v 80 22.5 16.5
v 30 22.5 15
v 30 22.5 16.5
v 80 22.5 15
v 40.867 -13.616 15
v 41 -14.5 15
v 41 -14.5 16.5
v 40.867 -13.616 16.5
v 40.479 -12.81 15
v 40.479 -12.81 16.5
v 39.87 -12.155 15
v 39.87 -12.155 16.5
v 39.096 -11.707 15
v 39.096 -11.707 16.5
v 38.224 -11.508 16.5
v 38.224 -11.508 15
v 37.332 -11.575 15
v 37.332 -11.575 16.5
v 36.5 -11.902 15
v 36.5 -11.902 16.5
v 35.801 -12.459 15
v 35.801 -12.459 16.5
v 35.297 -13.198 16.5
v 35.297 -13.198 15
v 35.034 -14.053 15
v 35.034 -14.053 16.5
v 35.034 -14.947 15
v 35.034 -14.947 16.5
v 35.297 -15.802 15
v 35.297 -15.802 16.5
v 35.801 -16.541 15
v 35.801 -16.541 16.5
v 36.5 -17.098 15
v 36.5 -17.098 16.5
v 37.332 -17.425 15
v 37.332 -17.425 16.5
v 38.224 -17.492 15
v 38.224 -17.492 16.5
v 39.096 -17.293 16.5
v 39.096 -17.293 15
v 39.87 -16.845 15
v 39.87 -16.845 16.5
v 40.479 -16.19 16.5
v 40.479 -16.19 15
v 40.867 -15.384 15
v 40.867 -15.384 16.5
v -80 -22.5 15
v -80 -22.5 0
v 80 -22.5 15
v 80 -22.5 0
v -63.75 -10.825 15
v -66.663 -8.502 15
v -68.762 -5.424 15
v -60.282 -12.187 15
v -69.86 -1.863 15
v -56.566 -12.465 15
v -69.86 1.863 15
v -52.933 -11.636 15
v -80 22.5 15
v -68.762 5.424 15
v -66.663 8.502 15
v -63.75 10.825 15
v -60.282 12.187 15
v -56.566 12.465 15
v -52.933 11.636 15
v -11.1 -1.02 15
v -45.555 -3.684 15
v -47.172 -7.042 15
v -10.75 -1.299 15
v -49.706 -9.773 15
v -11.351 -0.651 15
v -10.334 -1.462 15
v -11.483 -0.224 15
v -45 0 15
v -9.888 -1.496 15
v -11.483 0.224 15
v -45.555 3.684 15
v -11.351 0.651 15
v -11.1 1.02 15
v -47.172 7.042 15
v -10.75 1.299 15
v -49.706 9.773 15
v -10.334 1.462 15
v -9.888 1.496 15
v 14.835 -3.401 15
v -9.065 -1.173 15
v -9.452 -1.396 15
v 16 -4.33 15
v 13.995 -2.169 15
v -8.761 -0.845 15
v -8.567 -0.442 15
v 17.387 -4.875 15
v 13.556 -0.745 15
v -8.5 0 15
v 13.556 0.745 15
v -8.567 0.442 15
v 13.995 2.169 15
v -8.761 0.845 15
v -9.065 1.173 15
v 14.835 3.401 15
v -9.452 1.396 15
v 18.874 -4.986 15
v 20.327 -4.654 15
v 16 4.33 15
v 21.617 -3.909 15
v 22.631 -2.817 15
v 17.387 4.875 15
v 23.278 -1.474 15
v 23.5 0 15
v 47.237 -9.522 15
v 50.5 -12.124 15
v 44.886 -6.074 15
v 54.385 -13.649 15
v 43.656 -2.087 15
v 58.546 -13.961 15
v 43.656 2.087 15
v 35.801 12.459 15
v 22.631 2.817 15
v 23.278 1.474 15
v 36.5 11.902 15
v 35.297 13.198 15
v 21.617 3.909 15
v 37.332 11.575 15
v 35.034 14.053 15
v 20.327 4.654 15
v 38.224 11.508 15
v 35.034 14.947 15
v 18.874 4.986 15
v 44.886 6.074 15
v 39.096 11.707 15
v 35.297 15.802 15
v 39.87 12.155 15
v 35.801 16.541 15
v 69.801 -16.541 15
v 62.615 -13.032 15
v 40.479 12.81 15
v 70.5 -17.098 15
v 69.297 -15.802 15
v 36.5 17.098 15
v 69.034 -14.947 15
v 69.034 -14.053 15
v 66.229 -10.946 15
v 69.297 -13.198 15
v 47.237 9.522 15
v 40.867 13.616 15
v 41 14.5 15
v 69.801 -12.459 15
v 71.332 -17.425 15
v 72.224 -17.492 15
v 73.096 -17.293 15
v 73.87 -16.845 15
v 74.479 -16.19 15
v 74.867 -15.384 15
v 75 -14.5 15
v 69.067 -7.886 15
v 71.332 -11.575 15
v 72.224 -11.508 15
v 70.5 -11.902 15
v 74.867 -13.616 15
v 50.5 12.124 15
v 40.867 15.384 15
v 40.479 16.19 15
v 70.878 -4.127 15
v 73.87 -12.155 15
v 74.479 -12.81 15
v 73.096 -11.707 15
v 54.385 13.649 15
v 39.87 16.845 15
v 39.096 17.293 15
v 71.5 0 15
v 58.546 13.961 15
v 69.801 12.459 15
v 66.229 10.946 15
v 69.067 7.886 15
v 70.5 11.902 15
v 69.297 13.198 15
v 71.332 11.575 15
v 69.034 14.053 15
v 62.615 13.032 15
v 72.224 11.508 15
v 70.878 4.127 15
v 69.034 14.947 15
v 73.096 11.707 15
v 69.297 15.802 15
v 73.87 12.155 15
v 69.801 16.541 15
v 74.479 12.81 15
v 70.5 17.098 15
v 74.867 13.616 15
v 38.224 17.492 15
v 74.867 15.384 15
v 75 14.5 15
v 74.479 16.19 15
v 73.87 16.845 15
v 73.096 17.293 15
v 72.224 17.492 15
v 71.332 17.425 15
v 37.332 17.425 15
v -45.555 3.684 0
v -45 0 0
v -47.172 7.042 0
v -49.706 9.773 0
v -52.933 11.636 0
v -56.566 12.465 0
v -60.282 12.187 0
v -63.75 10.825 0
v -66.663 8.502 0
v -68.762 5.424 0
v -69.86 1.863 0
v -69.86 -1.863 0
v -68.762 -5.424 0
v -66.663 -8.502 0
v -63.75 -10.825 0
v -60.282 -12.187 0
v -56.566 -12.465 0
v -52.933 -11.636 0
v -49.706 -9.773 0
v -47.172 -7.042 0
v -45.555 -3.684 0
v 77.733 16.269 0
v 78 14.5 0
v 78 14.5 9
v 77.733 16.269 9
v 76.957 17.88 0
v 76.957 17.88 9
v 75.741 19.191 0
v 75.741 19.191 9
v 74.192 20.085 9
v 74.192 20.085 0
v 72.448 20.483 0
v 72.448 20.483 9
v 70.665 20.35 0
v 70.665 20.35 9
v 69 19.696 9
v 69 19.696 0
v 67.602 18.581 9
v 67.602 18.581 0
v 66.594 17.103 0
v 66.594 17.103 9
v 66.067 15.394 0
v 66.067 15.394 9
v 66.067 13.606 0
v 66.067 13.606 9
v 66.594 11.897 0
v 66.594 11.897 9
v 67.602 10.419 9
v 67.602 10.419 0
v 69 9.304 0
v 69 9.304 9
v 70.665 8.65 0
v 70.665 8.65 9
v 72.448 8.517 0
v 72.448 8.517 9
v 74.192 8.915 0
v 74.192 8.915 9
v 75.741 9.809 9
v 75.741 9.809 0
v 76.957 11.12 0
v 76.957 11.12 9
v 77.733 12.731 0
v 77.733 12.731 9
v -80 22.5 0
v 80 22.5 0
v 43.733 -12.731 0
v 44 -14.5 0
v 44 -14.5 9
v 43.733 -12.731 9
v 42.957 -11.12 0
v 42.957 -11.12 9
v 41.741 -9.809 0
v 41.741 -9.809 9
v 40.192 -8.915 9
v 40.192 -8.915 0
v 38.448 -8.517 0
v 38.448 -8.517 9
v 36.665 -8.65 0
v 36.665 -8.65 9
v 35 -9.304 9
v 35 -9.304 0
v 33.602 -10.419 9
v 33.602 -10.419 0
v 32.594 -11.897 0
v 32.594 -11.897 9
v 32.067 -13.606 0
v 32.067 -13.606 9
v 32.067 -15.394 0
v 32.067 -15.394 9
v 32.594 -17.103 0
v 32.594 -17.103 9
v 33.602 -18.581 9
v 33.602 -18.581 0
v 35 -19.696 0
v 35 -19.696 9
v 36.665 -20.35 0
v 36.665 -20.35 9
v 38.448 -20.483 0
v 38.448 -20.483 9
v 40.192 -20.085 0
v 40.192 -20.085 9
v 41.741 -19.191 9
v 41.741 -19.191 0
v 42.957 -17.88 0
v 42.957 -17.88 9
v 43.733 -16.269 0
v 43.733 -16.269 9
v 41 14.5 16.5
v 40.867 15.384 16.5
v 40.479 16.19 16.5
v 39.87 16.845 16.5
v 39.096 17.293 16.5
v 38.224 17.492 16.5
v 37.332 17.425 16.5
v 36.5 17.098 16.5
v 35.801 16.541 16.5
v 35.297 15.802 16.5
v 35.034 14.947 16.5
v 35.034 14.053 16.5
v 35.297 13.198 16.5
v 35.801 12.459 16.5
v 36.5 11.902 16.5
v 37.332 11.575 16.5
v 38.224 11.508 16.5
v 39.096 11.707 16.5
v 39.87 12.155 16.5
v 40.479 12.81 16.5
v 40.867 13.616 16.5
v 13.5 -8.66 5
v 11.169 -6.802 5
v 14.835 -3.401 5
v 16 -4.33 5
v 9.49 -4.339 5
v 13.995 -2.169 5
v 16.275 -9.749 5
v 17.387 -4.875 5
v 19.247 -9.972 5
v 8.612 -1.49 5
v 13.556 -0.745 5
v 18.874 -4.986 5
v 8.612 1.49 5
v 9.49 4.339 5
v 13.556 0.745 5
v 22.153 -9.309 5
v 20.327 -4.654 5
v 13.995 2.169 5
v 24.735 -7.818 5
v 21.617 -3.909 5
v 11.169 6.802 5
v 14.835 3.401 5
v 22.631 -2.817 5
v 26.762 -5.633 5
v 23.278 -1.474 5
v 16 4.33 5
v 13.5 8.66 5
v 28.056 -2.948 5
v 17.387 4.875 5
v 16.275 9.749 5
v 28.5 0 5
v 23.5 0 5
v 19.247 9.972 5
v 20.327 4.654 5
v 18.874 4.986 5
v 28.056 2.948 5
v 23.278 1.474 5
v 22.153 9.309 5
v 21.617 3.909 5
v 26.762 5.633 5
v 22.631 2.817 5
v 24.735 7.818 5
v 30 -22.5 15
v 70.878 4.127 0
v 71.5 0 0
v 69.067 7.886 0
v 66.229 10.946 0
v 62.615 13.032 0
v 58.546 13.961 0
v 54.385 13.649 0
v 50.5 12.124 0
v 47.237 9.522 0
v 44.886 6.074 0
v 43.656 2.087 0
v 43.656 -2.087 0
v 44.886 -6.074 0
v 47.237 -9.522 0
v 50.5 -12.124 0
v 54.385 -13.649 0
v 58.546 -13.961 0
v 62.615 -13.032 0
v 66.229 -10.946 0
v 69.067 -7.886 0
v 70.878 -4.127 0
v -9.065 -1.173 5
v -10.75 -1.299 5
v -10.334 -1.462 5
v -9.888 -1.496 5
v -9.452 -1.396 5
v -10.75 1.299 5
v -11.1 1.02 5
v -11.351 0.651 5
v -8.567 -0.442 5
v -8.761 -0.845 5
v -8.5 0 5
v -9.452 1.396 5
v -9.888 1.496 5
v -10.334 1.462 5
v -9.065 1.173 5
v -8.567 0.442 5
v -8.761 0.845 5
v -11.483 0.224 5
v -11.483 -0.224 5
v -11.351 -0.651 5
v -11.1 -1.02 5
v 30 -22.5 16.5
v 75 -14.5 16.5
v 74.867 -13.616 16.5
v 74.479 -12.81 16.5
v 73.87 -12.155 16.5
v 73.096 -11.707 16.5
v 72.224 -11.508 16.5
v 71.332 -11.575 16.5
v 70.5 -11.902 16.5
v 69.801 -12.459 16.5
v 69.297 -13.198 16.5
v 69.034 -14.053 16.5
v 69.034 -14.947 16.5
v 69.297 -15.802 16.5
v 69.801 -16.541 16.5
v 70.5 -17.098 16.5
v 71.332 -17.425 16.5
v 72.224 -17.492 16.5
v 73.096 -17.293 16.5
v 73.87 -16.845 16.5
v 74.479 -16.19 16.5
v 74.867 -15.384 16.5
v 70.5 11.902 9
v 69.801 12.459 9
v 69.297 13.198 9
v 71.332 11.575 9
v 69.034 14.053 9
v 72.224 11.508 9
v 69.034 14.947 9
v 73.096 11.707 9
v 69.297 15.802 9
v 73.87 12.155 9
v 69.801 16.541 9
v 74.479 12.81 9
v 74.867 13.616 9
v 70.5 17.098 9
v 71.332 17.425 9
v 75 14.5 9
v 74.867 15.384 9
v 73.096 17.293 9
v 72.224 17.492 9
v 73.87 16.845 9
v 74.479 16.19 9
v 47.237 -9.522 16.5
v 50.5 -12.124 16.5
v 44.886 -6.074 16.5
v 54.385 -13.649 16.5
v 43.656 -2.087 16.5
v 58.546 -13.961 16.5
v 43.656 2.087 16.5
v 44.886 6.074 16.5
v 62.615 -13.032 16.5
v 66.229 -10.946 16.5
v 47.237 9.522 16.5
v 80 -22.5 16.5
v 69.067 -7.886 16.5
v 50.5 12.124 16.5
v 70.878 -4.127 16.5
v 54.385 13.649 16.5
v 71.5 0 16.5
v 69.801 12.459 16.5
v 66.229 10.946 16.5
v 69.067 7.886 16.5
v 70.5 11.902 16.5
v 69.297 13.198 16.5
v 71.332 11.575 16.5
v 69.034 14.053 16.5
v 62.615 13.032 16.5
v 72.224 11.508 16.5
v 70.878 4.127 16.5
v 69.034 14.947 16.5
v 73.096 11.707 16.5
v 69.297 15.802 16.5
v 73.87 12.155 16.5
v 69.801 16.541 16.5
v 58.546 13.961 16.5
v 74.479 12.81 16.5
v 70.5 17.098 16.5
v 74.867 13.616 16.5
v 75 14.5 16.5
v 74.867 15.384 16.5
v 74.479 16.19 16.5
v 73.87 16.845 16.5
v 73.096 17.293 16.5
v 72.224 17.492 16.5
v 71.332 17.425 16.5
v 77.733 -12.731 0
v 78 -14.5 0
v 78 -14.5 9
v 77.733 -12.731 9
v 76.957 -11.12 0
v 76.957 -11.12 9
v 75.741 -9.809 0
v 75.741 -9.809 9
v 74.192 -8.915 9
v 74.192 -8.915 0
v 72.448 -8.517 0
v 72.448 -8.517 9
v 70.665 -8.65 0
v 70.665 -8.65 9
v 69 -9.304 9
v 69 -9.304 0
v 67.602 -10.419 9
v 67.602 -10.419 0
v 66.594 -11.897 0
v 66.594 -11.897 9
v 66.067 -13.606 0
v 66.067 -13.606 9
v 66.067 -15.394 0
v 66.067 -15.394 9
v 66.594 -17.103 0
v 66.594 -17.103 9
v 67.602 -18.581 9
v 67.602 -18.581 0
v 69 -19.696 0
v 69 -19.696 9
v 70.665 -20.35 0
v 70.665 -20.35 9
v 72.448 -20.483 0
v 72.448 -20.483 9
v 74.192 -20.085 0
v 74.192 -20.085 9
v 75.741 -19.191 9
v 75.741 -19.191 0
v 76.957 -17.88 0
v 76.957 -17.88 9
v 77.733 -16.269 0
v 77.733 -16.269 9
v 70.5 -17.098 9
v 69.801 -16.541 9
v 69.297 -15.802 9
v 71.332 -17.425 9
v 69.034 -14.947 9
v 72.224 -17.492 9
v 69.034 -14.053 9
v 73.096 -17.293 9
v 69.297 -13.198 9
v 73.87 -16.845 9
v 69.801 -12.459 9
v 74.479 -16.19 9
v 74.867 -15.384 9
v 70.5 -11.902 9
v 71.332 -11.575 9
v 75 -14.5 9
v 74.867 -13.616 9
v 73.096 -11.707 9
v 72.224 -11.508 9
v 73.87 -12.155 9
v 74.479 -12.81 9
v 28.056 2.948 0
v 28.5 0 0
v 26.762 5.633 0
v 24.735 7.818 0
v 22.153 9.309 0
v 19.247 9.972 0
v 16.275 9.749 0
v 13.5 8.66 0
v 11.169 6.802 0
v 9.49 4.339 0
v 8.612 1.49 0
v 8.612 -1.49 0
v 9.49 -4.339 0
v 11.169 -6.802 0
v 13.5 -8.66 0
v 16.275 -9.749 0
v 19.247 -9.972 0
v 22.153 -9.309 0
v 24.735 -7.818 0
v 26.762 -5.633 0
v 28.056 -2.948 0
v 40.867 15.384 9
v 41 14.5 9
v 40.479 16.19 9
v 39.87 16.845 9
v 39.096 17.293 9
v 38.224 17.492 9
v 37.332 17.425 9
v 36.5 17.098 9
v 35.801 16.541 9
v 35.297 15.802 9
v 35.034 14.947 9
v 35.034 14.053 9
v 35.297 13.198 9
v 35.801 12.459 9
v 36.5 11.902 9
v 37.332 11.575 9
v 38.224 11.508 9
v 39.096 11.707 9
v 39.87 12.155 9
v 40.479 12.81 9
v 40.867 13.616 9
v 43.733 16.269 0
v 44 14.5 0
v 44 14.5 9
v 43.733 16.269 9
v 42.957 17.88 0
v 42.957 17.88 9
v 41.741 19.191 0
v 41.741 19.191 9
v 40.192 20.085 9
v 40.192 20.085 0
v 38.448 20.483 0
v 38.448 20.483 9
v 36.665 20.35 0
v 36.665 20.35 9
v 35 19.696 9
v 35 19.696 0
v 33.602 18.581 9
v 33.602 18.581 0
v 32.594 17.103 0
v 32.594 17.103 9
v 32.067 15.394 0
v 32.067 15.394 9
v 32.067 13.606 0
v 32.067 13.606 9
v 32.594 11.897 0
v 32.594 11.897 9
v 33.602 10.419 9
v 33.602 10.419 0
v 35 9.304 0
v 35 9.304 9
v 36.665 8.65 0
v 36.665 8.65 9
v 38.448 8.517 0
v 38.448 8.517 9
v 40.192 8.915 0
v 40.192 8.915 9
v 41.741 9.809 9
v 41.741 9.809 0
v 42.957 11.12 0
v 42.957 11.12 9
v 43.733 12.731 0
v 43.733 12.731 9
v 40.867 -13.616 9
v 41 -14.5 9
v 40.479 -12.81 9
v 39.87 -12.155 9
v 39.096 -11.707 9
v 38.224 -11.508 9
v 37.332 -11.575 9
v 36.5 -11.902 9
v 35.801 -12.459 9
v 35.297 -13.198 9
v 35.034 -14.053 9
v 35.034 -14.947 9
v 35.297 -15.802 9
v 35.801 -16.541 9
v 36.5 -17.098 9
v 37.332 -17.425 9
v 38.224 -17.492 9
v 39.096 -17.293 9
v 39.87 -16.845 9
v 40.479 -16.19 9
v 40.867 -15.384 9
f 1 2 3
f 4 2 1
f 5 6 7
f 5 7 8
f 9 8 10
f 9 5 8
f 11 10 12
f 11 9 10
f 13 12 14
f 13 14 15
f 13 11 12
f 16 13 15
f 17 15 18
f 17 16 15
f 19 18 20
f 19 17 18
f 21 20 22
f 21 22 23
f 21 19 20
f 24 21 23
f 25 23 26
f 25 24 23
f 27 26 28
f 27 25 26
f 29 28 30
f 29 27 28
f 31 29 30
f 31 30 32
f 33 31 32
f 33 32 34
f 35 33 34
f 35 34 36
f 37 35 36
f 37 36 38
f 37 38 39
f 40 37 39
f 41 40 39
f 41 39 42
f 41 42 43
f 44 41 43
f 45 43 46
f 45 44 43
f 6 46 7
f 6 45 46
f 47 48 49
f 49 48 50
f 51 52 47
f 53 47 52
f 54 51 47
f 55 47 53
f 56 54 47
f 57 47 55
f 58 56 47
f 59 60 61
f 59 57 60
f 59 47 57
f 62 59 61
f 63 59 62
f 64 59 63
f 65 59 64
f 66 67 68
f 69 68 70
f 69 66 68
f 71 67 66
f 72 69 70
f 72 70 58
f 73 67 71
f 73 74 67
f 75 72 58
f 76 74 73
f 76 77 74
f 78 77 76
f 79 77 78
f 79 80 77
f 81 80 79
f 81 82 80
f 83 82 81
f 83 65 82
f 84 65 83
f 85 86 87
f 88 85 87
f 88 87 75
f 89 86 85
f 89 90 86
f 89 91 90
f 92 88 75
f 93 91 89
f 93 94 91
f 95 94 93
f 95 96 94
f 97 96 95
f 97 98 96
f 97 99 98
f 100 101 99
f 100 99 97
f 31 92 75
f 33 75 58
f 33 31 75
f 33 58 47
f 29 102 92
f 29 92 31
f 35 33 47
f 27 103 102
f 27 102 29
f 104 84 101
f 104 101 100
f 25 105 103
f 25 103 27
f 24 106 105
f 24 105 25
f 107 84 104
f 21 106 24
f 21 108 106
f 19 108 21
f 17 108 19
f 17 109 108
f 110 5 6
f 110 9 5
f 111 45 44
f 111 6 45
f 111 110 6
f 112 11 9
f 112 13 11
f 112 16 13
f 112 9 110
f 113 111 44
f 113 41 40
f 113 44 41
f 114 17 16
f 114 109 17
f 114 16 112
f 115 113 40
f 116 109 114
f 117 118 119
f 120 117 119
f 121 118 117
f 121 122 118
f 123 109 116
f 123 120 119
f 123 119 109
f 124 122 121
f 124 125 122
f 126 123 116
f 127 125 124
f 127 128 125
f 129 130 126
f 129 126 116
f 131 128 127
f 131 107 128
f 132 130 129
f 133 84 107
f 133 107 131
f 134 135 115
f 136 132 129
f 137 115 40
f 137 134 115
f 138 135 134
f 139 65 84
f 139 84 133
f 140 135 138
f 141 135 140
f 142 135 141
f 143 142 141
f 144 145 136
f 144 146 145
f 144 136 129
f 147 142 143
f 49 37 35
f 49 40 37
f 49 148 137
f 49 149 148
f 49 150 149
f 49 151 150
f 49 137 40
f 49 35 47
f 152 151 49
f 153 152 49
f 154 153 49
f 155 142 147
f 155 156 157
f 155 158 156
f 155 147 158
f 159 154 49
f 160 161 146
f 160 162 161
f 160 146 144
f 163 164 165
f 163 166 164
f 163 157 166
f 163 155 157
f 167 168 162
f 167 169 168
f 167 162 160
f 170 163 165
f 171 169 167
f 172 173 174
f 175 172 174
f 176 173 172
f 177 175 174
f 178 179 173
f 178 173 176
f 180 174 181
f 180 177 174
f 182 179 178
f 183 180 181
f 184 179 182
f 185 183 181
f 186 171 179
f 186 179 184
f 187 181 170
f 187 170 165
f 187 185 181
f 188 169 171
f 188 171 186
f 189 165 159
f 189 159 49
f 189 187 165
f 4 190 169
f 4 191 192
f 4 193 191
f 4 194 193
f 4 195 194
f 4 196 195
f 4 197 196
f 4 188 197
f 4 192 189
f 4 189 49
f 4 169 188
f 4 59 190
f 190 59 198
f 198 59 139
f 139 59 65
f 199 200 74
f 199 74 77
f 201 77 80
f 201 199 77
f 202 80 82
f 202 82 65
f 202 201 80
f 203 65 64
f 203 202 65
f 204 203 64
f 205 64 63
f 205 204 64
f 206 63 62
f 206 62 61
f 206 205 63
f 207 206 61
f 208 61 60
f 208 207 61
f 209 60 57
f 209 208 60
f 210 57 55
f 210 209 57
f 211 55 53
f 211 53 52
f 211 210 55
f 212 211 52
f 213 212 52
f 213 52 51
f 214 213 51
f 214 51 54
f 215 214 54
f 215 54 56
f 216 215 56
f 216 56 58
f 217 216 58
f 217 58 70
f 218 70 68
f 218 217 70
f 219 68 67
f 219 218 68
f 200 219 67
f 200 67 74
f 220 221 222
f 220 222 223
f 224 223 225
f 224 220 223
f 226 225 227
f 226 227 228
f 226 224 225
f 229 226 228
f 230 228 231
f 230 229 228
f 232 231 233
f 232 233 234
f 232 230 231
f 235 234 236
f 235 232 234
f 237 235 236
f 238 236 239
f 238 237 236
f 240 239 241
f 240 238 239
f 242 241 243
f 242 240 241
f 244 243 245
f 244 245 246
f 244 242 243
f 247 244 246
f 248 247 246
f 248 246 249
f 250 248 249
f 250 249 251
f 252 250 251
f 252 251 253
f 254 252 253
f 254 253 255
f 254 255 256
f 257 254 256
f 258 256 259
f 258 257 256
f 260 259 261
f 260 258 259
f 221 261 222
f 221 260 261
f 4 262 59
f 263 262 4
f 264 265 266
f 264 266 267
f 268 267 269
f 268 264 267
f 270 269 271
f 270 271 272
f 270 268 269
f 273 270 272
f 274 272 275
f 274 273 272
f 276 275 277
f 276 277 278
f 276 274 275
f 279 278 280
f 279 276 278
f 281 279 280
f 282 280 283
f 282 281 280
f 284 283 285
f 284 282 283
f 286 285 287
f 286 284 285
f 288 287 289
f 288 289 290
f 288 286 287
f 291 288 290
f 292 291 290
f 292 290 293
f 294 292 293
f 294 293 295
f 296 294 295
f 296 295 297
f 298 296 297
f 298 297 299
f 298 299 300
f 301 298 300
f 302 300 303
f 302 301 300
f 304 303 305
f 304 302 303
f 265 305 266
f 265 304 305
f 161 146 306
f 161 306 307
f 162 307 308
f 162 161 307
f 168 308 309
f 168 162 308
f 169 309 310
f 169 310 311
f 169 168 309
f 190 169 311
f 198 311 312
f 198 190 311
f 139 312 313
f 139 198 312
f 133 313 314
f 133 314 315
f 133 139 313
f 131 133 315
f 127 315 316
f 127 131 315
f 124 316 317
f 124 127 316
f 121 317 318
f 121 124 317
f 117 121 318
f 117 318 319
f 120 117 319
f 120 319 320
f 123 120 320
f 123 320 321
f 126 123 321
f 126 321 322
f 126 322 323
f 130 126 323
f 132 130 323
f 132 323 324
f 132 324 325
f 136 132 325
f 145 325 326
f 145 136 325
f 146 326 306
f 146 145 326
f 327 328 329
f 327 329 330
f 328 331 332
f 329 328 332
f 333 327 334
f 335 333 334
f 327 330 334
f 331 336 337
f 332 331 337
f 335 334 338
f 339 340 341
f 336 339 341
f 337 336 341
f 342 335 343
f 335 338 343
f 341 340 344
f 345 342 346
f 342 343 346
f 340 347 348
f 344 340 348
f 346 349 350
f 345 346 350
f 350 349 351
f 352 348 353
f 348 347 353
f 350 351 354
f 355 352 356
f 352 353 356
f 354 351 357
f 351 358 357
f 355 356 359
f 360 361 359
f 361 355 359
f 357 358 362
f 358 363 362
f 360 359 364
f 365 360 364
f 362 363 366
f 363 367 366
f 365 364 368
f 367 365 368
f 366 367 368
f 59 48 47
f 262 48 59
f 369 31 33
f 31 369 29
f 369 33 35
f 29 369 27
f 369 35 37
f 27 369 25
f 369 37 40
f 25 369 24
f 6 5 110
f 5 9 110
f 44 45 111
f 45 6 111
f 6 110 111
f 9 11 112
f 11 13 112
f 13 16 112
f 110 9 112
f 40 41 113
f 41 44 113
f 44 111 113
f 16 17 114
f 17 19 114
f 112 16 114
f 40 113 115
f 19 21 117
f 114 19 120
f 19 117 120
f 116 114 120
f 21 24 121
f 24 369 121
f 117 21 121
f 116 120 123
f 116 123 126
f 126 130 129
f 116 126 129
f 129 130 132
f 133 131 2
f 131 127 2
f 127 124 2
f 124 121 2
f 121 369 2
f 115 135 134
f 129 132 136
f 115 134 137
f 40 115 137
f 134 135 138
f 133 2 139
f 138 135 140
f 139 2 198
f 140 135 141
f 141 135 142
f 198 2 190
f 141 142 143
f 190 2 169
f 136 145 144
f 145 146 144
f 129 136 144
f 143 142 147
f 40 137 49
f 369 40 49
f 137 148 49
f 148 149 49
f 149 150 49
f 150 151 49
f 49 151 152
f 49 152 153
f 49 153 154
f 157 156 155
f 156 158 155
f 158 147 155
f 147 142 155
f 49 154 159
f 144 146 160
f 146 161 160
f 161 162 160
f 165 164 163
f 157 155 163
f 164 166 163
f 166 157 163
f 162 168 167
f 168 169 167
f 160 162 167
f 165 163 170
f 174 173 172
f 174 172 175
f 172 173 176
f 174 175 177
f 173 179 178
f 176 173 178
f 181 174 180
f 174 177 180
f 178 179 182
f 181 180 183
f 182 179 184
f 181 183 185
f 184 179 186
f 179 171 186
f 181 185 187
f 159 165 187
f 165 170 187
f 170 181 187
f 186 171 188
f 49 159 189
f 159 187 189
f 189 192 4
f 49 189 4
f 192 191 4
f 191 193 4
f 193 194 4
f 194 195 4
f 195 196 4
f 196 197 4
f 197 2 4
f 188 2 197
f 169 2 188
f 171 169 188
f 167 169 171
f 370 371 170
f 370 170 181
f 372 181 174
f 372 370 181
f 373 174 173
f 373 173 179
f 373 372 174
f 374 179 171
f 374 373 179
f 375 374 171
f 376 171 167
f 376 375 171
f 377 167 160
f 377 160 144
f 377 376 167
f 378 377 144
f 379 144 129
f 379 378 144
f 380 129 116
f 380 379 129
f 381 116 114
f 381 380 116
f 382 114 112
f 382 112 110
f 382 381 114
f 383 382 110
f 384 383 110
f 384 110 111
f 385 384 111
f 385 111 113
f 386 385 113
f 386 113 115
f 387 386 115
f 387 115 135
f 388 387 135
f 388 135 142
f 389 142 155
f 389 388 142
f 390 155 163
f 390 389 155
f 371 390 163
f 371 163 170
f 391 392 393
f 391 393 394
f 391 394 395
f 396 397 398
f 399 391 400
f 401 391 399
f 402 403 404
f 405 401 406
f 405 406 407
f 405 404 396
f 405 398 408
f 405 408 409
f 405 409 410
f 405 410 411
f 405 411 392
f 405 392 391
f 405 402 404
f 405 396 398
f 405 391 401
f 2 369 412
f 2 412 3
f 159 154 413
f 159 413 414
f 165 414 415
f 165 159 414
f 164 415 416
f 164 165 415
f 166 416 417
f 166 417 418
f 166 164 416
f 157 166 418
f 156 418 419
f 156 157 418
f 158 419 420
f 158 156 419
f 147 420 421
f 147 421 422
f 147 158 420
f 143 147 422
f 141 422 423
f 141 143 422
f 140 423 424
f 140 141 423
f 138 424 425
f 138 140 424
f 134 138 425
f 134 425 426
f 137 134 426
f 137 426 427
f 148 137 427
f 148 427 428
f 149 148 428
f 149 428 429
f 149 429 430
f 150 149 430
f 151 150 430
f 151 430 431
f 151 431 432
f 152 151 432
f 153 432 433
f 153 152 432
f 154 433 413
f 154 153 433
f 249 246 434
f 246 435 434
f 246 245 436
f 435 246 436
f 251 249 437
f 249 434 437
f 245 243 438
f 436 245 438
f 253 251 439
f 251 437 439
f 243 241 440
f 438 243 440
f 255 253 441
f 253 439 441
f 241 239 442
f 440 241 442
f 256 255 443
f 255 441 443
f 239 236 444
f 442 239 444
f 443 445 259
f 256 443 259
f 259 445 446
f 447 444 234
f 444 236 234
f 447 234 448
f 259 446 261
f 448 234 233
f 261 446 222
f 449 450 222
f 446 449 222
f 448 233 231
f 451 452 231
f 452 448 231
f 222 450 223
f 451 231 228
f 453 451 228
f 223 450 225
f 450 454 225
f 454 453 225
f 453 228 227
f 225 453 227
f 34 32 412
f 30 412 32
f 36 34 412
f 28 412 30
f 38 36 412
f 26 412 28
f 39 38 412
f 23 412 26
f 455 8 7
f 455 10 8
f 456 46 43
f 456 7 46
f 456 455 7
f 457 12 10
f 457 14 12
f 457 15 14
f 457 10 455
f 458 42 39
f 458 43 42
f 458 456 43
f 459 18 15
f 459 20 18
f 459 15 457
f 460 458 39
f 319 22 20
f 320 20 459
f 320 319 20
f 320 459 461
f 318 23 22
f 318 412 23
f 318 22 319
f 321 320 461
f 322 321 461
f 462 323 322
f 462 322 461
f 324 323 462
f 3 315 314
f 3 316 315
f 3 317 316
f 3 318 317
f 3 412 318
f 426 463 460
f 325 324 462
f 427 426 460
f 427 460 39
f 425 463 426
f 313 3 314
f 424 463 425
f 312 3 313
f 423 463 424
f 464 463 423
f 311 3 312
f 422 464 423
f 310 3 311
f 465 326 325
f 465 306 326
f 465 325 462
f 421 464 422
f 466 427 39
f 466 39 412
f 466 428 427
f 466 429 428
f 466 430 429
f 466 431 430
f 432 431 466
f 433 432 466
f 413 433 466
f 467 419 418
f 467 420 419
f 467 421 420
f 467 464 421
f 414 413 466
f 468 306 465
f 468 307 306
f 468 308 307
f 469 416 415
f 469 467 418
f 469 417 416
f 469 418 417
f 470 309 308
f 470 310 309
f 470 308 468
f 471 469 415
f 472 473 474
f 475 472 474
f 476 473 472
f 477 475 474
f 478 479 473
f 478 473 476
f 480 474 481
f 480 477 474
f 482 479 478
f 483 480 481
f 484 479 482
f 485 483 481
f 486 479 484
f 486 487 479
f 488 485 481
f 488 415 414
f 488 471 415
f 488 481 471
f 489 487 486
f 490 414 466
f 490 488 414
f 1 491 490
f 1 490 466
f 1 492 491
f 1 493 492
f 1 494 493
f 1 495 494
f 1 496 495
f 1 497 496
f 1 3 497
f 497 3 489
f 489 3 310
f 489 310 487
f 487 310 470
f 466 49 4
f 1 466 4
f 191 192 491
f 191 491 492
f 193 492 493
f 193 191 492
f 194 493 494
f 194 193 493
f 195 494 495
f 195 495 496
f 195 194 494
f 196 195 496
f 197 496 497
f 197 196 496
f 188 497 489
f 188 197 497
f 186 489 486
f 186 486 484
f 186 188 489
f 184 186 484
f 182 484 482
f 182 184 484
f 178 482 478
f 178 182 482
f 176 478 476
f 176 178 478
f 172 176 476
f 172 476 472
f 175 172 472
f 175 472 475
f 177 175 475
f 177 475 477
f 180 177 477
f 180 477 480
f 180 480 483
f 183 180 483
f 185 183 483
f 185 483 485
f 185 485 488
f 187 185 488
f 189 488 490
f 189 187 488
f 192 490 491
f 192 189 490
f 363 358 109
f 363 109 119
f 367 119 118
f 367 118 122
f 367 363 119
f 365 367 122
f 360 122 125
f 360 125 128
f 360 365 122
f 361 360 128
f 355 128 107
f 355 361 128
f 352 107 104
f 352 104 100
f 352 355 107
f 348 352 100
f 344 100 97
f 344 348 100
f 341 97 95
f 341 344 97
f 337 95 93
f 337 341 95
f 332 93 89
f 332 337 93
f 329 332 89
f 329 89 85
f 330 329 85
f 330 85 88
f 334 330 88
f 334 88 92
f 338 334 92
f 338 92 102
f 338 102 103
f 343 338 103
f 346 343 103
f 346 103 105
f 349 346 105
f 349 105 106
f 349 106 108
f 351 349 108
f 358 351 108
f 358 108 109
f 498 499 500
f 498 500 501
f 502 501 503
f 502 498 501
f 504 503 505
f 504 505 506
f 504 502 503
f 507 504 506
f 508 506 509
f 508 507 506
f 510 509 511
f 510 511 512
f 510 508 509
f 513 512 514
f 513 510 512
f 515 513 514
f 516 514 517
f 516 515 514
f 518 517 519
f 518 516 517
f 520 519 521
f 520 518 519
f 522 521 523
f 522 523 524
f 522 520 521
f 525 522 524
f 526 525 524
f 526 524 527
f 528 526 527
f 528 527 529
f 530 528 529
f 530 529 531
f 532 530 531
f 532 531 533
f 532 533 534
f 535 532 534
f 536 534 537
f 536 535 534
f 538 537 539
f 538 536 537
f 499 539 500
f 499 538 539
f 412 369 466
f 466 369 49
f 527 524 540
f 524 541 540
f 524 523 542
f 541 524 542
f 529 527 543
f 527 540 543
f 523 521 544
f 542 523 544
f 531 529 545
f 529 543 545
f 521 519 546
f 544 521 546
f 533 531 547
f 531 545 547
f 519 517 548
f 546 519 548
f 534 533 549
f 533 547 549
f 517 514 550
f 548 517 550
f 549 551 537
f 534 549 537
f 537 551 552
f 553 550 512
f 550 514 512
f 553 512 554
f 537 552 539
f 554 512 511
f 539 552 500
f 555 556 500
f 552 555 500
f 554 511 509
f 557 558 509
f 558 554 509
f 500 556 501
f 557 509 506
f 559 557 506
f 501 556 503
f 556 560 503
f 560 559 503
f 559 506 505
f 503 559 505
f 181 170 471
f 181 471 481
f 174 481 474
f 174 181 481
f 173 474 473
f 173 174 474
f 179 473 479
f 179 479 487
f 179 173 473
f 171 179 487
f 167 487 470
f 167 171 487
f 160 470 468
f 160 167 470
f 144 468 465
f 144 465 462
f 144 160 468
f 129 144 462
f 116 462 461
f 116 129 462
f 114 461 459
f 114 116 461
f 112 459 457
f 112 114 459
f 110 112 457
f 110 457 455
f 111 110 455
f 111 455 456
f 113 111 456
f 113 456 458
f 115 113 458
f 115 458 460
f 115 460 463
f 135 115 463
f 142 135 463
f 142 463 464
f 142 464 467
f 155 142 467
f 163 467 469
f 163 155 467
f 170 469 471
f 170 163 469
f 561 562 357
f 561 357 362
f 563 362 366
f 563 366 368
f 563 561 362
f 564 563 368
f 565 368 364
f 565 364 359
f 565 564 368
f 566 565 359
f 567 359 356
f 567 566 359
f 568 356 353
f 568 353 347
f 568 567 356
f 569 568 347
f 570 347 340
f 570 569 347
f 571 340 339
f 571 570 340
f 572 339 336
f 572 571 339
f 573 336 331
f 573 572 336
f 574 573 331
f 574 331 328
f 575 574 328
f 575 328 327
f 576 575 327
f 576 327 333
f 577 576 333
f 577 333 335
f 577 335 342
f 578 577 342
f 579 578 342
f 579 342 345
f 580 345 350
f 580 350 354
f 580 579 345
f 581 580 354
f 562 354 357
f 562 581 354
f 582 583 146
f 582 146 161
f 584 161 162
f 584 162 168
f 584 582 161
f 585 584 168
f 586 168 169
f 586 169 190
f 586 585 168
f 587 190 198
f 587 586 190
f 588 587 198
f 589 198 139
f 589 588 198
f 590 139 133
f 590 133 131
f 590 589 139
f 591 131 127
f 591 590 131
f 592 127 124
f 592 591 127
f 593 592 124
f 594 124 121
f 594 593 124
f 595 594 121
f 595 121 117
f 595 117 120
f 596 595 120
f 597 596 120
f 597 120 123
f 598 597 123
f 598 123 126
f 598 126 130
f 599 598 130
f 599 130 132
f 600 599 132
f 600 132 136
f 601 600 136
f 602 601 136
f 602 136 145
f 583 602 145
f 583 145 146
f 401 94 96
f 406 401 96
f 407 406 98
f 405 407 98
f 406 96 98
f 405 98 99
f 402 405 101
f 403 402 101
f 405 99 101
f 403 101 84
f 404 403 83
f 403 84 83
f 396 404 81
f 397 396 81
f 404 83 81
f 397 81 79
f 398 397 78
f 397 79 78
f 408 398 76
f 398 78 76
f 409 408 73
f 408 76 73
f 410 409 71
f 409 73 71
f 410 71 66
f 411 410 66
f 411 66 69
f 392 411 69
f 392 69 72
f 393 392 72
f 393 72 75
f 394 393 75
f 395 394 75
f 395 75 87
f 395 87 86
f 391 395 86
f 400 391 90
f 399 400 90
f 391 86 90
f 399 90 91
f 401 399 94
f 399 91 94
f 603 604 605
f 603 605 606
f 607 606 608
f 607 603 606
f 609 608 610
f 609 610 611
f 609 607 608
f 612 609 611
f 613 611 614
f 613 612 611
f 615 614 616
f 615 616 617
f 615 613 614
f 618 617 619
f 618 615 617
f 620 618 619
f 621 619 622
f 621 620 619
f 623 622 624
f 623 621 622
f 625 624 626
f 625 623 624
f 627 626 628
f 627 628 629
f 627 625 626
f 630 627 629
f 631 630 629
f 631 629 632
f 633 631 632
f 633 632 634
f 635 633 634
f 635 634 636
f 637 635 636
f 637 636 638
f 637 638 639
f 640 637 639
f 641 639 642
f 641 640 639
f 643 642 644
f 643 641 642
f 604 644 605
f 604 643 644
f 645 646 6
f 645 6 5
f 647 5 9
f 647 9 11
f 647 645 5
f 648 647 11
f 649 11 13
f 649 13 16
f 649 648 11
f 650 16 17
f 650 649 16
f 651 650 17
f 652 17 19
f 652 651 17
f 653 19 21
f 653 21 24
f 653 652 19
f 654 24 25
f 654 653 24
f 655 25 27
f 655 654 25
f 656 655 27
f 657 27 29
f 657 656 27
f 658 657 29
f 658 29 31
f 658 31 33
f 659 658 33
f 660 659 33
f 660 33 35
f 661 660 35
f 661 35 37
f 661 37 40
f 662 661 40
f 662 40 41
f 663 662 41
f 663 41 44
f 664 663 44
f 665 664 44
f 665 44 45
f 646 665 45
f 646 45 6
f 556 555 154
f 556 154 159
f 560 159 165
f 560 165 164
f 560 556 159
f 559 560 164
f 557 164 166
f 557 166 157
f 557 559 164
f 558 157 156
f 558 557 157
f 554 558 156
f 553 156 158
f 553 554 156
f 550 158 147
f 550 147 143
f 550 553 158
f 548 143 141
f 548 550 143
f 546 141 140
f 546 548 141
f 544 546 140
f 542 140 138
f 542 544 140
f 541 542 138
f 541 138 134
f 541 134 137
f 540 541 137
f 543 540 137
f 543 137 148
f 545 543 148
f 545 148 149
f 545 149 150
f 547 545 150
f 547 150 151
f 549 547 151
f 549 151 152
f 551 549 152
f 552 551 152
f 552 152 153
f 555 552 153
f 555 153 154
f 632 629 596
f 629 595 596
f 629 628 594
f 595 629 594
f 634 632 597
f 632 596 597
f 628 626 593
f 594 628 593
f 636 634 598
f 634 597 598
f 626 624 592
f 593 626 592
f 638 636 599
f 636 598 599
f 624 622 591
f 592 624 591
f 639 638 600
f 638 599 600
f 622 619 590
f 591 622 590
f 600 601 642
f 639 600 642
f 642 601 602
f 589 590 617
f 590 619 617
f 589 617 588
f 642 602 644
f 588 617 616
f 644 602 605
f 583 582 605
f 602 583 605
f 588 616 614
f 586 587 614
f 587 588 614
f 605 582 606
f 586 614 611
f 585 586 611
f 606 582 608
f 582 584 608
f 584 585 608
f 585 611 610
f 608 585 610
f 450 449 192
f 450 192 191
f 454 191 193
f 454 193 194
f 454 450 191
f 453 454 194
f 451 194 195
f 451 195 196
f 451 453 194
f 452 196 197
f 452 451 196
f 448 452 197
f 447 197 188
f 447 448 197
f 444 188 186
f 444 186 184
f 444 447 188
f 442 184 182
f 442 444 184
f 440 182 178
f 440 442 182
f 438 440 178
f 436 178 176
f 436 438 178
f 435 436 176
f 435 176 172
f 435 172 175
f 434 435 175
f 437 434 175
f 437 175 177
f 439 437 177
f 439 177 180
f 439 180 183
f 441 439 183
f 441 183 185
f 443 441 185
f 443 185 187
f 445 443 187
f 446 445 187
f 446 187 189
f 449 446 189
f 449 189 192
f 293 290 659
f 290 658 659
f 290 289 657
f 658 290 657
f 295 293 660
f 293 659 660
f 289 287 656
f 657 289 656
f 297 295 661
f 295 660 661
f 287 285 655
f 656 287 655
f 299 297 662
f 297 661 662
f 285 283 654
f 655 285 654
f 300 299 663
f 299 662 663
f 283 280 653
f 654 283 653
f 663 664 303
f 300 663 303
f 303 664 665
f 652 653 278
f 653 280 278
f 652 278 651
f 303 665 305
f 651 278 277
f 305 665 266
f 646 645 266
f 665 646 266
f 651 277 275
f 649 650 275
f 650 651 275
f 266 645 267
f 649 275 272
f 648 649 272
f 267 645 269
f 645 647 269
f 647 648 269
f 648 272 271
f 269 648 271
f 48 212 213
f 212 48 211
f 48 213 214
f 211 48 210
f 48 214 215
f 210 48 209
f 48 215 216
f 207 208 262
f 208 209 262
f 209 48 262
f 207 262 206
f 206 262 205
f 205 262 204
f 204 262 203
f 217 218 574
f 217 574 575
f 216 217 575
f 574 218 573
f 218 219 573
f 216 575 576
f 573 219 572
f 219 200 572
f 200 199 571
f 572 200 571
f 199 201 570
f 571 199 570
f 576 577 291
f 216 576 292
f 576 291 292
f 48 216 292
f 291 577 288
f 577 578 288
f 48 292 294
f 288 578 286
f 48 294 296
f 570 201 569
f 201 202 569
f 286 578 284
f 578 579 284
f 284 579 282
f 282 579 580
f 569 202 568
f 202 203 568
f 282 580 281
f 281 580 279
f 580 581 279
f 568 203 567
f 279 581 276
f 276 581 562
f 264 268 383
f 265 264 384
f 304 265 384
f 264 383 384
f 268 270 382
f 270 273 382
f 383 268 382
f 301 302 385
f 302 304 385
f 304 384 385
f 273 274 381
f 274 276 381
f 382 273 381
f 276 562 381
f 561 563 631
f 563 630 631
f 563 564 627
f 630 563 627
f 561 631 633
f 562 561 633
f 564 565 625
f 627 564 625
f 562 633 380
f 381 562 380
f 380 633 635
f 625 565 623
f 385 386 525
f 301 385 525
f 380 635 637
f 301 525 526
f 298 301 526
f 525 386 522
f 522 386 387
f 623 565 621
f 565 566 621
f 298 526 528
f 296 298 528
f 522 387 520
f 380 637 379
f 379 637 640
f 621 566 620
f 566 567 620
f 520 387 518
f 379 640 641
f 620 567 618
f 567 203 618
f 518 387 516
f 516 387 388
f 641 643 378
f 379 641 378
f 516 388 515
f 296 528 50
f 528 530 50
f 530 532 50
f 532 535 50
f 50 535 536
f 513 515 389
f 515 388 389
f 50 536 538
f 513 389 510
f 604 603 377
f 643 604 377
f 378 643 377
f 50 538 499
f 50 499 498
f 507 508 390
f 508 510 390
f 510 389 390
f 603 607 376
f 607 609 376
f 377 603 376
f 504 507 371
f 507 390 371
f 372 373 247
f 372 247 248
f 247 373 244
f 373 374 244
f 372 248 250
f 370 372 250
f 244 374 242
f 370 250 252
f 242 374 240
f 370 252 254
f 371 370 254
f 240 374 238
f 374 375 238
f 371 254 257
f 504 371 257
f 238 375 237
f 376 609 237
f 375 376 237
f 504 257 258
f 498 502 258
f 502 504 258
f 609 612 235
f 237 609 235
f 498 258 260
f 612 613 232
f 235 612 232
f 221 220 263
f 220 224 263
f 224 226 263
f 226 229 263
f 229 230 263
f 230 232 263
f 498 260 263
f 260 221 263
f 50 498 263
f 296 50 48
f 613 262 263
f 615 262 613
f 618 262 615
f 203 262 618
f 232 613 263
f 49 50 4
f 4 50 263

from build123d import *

# Parameters (mm, degrees)
F0_W     = 160
F0_H     = 45
F0_R     = 6
F0_R_2   = 12.5
F0_R_3   = 10
F0_R_4   = 14
F0_R_5   = 5
F0_R_6   = 3
F1_DEPTH = 15
F2_DEPTH = 5
F3_DEPTH = 9
F4_R     = 1.5
F5_DEPTH = 10
F6_W     = 50
F6_H     = 45
F6_R     = 3
F6_R_2   = 14
F7_DEPTH = 1.5


# Not quite as in the source:
# - a feature names something its author has since deleted; it is built from what else it names


with BuildPart() as f1:
    # F0 (on Top) → F1 (new body)
    with BuildSketch(Plane.XY):
        Rectangle(F0_W, F0_H)
        with Locations((38, -14.5)):
            Circle(F0_R, mode=Mode.SUBTRACT)
        with Locations((72, -14.5)):
            Circle(F0_R, mode=Mode.SUBTRACT)
        with Locations((-57.5, 0)):
            Circle(F0_R_2, mode=Mode.SUBTRACT)
        with Locations((18.5, 0)):
            Circle(F0_R_3, mode=Mode.SUBTRACT)
        with Locations((57.5, 0)):
            Circle(F0_R_4, mode=Mode.SUBTRACT)
        with Locations((38, 14.5)):
            Circle(F0_R, mode=Mode.SUBTRACT)
        with Locations((72, 14.5)):
            Circle(F0_R, mode=Mode.SUBTRACT)
        with Locations((18.5, 0)):
            Circle(F0_R_3)
        with Locations((18.5, 0)):
            Circle(F0_R_5, mode=Mode.SUBTRACT)
        with Locations((38, -14.5)):
            Circle(F0_R)
        with Locations((38, -14.5)):
            Circle(F0_R_6, mode=Mode.SUBTRACT)
        with Locations((72, -14.5)):
            Circle(F0_R)
        with Locations((72, -14.5)):
            Circle(F0_R_6, mode=Mode.SUBTRACT)
        with Locations((72, 14.5)):
            Circle(F0_R)
        with Locations((72, 14.5)):
            Circle(F0_R_6, mode=Mode.SUBTRACT)
        with Locations((38, 14.5)):
            Circle(F0_R)
        with Locations((38, 14.5)):
            Circle(F0_R_6, mode=Mode.SUBTRACT)
    extrude(amount=F1_DEPTH)

    # F0 (on Top) → F2 (cut)
    with BuildSketch(Plane.XY):
        with Locations((18.5, 0)):
            Circle(F0_R_3)
        with Locations((18.5, 0)):
            Circle(F0_R_5, mode=Mode.SUBTRACT)
    extrude(amount=F2_DEPTH, mode=Mode.SUBTRACT)

    # F0 (on Top) → F3 (cut)
    with BuildSketch(Plane.XY):
        with Locations((38, -14.5)):
            Circle(F0_R)
        with Locations((38, -14.5)):
            Circle(F0_R_6, mode=Mode.SUBTRACT)
        with Locations((72, -14.5)):
            Circle(F0_R)
        with Locations((72, -14.5)):
            Circle(F0_R_6, mode=Mode.SUBTRACT)
        with Locations((72, 14.5)):
            Circle(F0_R)
        with Locations((72, 14.5)):
            Circle(F0_R_6, mode=Mode.SUBTRACT)
        with Locations((38, 14.5)):
            Circle(F0_R)
        with Locations((38, 14.5)):
            Circle(F0_R_6, mode=Mode.SUBTRACT)
    extrude(amount=F3_DEPTH, mode=Mode.SUBTRACT)

    # F4 (on face) → F5 (cut)
    with BuildSketch(Plane.XY.offset(15)):
        with Locations((-10, 0)):
            Circle(F4_R)
    extrude(amount=-F5_DEPTH, mode=Mode.SUBTRACT)


with BuildPart() as f7:
    # F6 (on face) → F7 (new body)
    with BuildSketch(Plane.XY.offset(15)):
        with Locations((55, 0)):
            Rectangle(F6_W, F6_H)
        with Locations((38, -14.5)):
            Circle(F6_R, mode=Mode.SUBTRACT)
        with Locations((72, -14.5)):
            Circle(F6_R, mode=Mode.SUBTRACT)
        with Locations((57.5, 0)):
            Circle(F6_R_2, mode=Mode.SUBTRACT)
        with Locations((38, 14.5)):
            Circle(F6_R, mode=Mode.SUBTRACT)
        with Locations((72, 14.5)):
            Circle(F6_R, mode=Mode.SUBTRACT)
    extrude(amount=F7_DEPTH)


solid = Compound([f1.part, f7.part])
